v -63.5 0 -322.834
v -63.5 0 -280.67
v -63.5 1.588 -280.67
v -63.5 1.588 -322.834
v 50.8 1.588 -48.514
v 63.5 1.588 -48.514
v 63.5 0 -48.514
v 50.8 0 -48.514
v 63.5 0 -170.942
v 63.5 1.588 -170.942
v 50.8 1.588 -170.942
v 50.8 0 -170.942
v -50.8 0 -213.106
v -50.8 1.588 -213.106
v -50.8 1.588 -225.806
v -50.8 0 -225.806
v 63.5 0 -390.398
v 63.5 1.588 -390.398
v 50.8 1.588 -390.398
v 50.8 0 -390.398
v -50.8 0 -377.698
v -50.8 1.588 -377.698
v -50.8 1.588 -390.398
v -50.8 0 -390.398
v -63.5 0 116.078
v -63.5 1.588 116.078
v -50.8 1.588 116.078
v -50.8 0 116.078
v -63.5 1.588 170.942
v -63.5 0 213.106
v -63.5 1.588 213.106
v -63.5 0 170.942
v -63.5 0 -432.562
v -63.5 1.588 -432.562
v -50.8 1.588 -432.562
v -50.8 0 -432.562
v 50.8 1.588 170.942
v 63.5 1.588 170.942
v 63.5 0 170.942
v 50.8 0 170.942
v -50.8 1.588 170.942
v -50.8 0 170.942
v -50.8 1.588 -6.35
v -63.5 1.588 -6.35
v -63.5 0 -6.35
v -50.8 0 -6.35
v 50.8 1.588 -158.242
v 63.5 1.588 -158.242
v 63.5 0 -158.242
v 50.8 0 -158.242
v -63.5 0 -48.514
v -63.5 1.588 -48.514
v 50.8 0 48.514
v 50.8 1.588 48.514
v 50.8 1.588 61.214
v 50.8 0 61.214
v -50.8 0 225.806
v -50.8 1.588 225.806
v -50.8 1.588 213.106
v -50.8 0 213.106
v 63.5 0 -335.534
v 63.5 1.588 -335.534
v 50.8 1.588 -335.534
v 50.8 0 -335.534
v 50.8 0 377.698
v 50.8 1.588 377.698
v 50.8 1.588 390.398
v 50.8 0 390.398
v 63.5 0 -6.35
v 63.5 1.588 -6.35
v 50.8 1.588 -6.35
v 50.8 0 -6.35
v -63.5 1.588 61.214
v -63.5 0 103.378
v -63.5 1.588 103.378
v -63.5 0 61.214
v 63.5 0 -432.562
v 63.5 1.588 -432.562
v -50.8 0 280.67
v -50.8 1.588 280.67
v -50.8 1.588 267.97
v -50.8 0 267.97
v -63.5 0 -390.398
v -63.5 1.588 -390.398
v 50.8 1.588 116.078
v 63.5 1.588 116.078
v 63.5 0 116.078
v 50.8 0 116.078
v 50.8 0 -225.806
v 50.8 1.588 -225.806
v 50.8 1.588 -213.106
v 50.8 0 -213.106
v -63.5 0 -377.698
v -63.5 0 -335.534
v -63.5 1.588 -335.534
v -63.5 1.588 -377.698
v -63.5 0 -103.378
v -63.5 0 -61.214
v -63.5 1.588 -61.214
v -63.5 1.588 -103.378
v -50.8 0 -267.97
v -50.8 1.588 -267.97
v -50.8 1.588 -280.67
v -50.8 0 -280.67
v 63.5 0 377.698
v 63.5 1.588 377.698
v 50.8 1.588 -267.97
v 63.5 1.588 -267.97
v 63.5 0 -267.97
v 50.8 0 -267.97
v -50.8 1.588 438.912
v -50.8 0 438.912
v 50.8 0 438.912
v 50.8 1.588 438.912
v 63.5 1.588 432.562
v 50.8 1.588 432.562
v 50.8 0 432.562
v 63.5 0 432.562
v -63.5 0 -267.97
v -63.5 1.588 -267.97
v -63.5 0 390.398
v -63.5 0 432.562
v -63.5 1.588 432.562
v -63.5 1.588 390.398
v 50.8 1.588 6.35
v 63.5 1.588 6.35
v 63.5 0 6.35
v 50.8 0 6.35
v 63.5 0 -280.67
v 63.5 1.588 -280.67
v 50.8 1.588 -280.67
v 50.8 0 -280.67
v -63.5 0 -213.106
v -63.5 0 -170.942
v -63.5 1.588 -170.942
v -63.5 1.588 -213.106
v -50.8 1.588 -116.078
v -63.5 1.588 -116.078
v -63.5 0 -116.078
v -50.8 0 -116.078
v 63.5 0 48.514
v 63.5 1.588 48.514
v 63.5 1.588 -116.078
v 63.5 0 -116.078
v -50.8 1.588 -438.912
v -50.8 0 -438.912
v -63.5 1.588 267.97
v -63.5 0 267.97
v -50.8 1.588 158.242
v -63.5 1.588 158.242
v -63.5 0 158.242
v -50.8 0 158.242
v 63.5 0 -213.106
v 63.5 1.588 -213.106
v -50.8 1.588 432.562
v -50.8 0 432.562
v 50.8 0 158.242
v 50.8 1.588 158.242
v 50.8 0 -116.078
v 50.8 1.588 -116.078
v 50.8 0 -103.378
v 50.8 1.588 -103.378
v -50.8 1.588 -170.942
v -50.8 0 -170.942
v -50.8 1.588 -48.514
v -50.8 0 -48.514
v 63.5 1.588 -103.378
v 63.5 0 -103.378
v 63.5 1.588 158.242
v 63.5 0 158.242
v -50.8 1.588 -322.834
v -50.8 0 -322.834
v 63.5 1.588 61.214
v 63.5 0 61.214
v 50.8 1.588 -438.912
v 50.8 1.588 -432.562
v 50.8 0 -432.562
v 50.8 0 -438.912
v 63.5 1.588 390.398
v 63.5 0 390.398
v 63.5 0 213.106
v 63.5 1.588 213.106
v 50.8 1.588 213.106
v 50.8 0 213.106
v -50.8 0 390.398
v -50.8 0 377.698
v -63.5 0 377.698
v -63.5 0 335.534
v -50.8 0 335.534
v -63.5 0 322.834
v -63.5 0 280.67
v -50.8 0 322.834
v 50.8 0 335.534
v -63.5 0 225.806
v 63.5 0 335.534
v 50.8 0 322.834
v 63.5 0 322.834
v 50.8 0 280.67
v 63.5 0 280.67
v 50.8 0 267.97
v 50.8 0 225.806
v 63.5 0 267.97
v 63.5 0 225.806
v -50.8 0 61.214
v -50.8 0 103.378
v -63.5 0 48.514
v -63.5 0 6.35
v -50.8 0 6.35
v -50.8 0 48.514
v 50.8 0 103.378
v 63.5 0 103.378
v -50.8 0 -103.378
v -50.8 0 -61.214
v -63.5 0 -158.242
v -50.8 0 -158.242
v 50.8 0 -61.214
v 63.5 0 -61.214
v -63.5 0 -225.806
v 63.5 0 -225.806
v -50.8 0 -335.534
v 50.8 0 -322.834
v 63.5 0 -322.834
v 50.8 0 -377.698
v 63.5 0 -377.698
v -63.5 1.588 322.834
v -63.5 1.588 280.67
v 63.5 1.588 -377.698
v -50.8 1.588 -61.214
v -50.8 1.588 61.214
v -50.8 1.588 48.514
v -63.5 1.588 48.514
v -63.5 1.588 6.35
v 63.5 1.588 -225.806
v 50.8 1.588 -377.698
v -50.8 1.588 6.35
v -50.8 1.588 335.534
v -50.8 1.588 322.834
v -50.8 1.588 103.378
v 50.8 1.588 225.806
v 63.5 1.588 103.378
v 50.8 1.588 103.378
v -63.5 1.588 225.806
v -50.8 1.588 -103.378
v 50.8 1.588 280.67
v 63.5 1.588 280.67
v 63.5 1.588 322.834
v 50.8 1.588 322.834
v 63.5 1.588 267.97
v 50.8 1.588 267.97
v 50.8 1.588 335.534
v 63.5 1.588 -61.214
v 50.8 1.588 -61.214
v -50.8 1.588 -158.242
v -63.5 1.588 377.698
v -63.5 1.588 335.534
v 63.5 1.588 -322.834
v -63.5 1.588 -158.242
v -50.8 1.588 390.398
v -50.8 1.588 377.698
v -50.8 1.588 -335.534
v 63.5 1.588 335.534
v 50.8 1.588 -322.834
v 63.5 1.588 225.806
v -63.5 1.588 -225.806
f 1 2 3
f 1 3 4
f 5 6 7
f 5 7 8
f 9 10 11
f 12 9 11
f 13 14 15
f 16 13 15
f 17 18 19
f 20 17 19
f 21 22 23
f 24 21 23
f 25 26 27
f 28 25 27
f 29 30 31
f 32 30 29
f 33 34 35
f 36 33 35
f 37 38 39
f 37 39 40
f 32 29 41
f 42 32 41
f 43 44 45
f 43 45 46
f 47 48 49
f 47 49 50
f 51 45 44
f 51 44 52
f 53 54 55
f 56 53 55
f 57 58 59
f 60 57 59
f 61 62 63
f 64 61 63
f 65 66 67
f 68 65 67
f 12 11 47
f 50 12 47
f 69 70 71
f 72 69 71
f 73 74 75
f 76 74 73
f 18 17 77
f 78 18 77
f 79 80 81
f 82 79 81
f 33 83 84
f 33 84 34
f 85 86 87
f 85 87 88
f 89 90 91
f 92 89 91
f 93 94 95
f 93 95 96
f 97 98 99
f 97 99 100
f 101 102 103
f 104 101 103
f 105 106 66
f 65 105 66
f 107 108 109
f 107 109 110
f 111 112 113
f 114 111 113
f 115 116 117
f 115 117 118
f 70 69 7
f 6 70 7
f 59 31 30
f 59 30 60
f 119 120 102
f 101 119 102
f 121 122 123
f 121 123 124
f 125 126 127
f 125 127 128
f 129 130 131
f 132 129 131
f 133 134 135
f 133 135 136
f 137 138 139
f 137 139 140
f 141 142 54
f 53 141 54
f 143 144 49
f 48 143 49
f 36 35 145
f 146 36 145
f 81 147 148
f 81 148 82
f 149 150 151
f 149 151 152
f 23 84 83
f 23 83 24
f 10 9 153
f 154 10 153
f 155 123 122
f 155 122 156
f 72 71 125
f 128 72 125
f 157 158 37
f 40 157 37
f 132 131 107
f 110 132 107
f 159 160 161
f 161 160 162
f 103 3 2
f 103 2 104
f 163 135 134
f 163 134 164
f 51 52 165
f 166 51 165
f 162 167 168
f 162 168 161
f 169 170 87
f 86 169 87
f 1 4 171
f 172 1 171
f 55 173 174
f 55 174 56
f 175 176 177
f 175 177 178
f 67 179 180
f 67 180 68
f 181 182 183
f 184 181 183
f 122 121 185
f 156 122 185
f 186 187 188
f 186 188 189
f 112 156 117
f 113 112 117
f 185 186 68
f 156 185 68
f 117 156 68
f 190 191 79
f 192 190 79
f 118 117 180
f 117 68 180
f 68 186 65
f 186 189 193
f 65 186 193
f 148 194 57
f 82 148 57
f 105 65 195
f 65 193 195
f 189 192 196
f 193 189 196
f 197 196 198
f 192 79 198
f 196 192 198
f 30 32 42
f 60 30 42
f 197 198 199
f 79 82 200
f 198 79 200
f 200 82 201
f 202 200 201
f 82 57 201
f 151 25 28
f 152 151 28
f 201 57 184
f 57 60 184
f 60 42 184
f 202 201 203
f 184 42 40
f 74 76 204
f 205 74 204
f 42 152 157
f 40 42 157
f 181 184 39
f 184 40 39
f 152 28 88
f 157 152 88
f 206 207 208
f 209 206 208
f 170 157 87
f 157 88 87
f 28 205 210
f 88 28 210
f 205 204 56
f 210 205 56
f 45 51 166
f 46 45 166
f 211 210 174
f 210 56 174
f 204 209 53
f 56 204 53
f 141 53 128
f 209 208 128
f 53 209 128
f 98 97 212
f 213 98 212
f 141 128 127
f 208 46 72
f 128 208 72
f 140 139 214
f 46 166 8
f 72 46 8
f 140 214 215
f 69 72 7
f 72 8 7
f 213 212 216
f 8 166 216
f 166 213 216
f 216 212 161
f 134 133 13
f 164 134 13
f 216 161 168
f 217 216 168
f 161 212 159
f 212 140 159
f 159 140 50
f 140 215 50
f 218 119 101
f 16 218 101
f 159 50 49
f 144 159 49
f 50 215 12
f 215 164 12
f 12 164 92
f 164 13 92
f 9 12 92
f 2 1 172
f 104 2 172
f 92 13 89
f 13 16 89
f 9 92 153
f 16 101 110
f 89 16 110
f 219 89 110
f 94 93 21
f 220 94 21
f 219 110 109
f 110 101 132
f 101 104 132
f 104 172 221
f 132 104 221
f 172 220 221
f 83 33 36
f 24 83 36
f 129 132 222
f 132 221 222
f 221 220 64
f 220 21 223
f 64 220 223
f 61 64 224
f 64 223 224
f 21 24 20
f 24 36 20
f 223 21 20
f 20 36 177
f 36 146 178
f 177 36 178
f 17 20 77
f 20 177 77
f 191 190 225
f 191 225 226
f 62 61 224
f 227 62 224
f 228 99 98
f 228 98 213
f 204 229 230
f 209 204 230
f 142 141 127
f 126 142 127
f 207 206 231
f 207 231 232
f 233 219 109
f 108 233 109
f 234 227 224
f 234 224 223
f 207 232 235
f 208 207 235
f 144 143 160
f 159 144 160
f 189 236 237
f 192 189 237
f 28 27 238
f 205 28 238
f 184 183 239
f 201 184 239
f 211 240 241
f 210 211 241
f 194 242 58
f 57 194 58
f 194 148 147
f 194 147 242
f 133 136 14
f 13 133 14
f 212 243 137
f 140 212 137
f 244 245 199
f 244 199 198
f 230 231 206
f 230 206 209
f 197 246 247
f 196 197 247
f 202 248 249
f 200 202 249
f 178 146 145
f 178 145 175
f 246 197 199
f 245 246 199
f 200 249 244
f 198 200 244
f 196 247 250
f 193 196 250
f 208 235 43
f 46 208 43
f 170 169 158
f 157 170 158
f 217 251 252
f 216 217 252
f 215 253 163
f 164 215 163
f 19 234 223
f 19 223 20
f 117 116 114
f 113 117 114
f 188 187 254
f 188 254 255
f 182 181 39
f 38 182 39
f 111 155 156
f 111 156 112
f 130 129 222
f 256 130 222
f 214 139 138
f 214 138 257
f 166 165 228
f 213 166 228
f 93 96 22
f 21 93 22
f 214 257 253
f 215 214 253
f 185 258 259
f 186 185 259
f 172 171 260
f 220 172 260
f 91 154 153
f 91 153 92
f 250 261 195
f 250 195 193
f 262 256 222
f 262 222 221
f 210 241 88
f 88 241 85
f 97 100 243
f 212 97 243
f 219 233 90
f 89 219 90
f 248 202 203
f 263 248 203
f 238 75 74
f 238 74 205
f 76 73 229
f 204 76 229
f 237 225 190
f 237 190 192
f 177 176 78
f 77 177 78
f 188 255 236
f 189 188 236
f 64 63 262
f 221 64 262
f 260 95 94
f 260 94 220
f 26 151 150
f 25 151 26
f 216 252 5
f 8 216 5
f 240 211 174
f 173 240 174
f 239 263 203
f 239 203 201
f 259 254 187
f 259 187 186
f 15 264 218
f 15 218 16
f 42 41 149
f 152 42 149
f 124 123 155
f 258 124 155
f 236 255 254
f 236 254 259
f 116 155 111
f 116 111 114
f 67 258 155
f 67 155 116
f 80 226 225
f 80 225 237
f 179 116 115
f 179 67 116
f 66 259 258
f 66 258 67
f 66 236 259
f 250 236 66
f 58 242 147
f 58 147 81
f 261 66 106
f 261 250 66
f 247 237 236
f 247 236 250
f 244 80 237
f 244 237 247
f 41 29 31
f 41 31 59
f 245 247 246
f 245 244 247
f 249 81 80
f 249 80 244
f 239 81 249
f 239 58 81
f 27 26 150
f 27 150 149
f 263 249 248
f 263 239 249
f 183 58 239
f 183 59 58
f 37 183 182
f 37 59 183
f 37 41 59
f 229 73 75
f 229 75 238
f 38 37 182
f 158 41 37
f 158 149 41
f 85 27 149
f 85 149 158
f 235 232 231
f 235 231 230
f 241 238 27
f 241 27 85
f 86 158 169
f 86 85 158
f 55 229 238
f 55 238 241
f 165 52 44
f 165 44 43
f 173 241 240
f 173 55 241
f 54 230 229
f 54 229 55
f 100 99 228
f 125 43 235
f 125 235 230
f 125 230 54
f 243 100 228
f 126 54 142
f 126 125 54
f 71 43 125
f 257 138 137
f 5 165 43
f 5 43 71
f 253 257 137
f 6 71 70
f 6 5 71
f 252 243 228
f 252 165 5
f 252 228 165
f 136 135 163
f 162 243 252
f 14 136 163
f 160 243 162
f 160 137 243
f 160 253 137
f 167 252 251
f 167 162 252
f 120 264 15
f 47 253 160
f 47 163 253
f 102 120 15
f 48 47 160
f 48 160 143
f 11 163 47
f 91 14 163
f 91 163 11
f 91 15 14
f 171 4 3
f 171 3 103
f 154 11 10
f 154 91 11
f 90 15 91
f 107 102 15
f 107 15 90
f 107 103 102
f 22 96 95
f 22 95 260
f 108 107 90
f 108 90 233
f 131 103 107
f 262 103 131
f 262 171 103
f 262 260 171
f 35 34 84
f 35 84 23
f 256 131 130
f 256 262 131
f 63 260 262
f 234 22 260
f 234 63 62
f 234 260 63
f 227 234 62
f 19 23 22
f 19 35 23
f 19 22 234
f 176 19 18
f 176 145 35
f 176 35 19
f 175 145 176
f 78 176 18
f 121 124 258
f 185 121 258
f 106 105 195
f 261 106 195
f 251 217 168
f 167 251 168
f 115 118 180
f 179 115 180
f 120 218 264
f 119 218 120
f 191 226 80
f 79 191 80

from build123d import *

# Parameters (mm, degrees)
SKETCH1_W                  = 127
SKETCH1_H                  = 877.824
BOSS_EXTRUDE1_DEPTH        = 1.5875
SKETCH2_W                  = 12.7
SKETCH2_H                  = 6.35
CUT_EXTRUDE1_DEPTH         = 444.48451371
SKETCH3_W                  = 12.7
SKETCH3_H                  = 12.7
CUT_EXTRUDE2_DEPTH         = 444.48451371
LPATTERN1_COUNT            = 15
LPATTERN1_PITCH            = 54.864
LPATTERN1_COPY_1_SKETCH_W  = 12.7
LPATTERN1_COPY_1_SKETCH_H  = 12.7
LPATTERN1_COPY_1_DEPTH     = 444.48451371
LPATTERN1_COPY_2_SKETCH_W  = 12.7
LPATTERN1_COPY_2_SKETCH_H  = 12.7
LPATTERN1_COPY_2_DEPTH     = 444.48451371
LPATTERN1_COPY_3_SKETCH_W  = 12.7
LPATTERN1_COPY_3_SKETCH_H  = 12.7
LPATTERN1_COPY_3_DEPTH     = 444.48451371
LPATTERN1_COPY_4_SKETCH_W  = 12.7
LPATTERN1_COPY_4_SKETCH_H  = 12.7
LPATTERN1_COPY_4_DEPTH     = 444.48451371
LPATTERN1_COPY_5_SKETCH_W  = 12.7
LPATTERN1_COPY_5_SKETCH_H  = 12.7
LPATTERN1_COPY_5_DEPTH     = 444.48451371
LPATTERN1_COPY_6_SKETCH_W  = 12.7
LPATTERN1_COPY_6_SKETCH_H  = 12.7
LPATTERN1_COPY_6_DEPTH     = 444.48451371
LPATTERN1_COPY_7_SKETCH_W  = 12.7
LPATTERN1_COPY_7_SKETCH_H  = 12.7
LPATTERN1_COPY_7_DEPTH     = 444.48451371
LPATTERN1_COPY_8_SKETCH_W  = 12.7
LPATTERN1_COPY_8_SKETCH_H  = 12.7
LPATTERN1_COPY_8_DEPTH     = 444.48451371
LPATTERN1_COPY_9_SKETCH_W  = 12.7
LPATTERN1_COPY_9_SKETCH_H  = 12.7
LPATTERN1_COPY_9_DEPTH     = 444.48451371
LPATTERN1_COPY_10_SKETCH_W = 12.7
LPATTERN1_COPY_10_SKETCH_H = 12.7
LPATTERN1_COPY_10_DEPTH    = 444.48451371
LPATTERN1_COPY_11_SKETCH_W = 12.7
LPATTERN1_COPY_11_SKETCH_H = 12.7
LPATTERN1_COPY_11_DEPTH    = 444.48451371
LPATTERN1_COPY_12_SKETCH_W = 12.7
LPATTERN1_COPY_12_SKETCH_H = 12.7
LPATTERN1_COPY_12_DEPTH    = 444.48451371
LPATTERN1_COPY_13_SKETCH_W = 12.7
LPATTERN1_COPY_13_SKETCH_H = 12.7
LPATTERN1_COPY_13_DEPTH    = 444.48451371
LPATTERN1_COPY_14_SKETCH_W = 12.7
LPATTERN1_COPY_14_SKETCH_H = 12.7
LPATTERN1_COPY_14_DEPTH    = 444.48451371


with BuildPart() as part:
    # Sketch1 → Boss-Extrude1 (new body)
    with BuildSketch(Plane(origin=(0, 0, 0), x_dir=(1, 0, 0), z_dir=(0, 1, 0))):
        Rectangle(SKETCH1_W, SKETCH1_H)
    extrude(amount=BOSS_EXTRUDE1_DEPTH)

    # Sketch2 → Cut-Extrude1 (cut, through all)
    with BuildSketch(Plane(origin=(0, 1.5875, 0), x_dir=(1, 0, 0), z_dir=(0, 1, 0))):
        with Locations((-57.15, 435.737)):
            Rectangle(SKETCH2_W, SKETCH2_H)
        with Locations((57.15, 435.737)):
            Rectangle(SKETCH2_W, SKETCH2_H)
    cut_extrude1 = extrude(amount=-CUT_EXTRUDE1_DEPTH, mode=Mode.SUBTRACT)

    # Mirror1: Cut-Extrude1 across plane
    add(cut_extrude1.mirror(Plane.XY), mode=Mode.SUBTRACT)

    # Sketch3 → Cut-Extrude2 (cut, through all)
    with BuildSketch(Plane(origin=(0, 1.5875, 0), x_dir=(1, 0, 0), z_dir=(0, 1, 0))):
        with Locations((-57.15, 384.048)):
            Rectangle(SKETCH3_W, SKETCH3_H)
    cut_extrude2 = extrude(amount=-CUT_EXTRUDE2_DEPTH, mode=Mode.SUBTRACT)

    # Mirror2: Cut-Extrude2 across plane
    add(cut_extrude2.mirror(Plane(origin=(0, 0, 0), x_dir=(0, 0, 1), z_dir=(1, 0, 0))), mode=Mode.SUBTRACT)

    # LPattern1: Cut-Extrude2 ×15
    with Locations(*[(0, 0, i * LPATTERN1_PITCH) for i in range(1, LPATTERN1_COUNT)]):
        add(cut_extrude2, mode=Mode.SUBTRACT)

    # LPattern1 copy 1 sketch → LPattern1 copy 1 (cut, through all)
    with BuildSketch(Plane(origin=(0, 1.5875, 54.864), x_dir=(-1, 0, 0), z_dir=(0, 1, 0))):
        with Locations((-57.15, -384.048)):
            Rectangle(LPATTERN1_COPY_1_SKETCH_W, LPATTERN1_COPY_1_SKETCH_H)
    extrude(amount=-LPATTERN1_COPY_1_DEPTH, mode=Mode.SUBTRACT)

    # LPattern1 copy 2 sketch → LPattern1 copy 2 (cut, through all)
    with BuildSketch(Plane(origin=(0, 1.5875, 109.728), x_dir=(-1, 0, 0), z_dir=(0, 1, 0))):
        with Locations((-57.15, -384.048)):
            Rectangle(LPATTERN1_COPY_2_SKETCH_W, LPATTERN1_COPY_2_SKETCH_H)
    extrude(amount=-LPATTERN1_COPY_2_DEPTH, mode=Mode.SUBTRACT)

    # LPattern1 copy 3 sketch → LPattern1 copy 3 (cut, through all)
    with BuildSketch(Plane(origin=(0, 1.5875, 164.592), x_dir=(-1, 0, 0), z_dir=(0, 1, 0))):
        with Locations((-57.15, -384.048)):
            Rectangle(LPATTERN1_COPY_3_SKETCH_W, LPATTERN1_COPY_3_SKETCH_H)
    extrude(amount=-LPATTERN1_COPY_3_DEPTH, mode=Mode.SUBTRACT)

    # LPattern1 copy 4 sketch → LPattern1 copy 4 (cut, through all)
    with BuildSketch(Plane(origin=(0, 1.5875, 219.456), x_dir=(-1, 0, 0), z_dir=(0, 1, 0))):
        with Locations((-57.15, -384.048)):
            Rectangle(LPATTERN1_COPY_4_SKETCH_W, LPATTERN1_COPY_4_SKETCH_H)
    extrude(amount=-LPATTERN1_COPY_4_DEPTH, mode=Mode.SUBTRACT)

    # LPattern1 copy 5 sketch → LPattern1 copy 5 (cut, through all)
    with BuildSketch(Plane(origin=(0, 1.5875, 274.32), x_dir=(-1, 0, 0), z_dir=(0, 1, 0))):
        with Locations((-57.15, -384.048)):
            Rectangle(LPATTERN1_COPY_5_SKETCH_W, LPATTERN1_COPY_5_SKETCH_H)
    extrude(amount=-LPATTERN1_COPY_5_DEPTH, mode=Mode.SUBTRACT)

    # LPattern1 copy 6 sketch → LPattern1 copy 6 (cut, through all)
    with BuildSketch(Plane(origin=(0, 1.5875, 329.184), x_dir=(-1, 0, 0), z_dir=(0, 1, 0))):
        with Locations((-57.15, -384.048)):
            Rectangle(LPATTERN1_COPY_6_SKETCH_W, LPATTERN1_COPY_6_SKETCH_H)
    extrude(amount=-LPATTERN1_COPY_6_DEPTH, mode=Mode.SUBTRACT)

    # LPattern1 copy 7 sketch → LPattern1 copy 7 (cut, through all)
    with BuildSketch(Plane(origin=(0, 1.5875, 384.048), x_dir=(-1, 0, 0), z_dir=(0, 1, 0))):
        with Locations((-57.15, -384.048)):
            Rectangle(LPATTERN1_COPY_7_SKETCH_W, LPATTERN1_COPY_7_SKETCH_H)
    extrude(amount=-LPATTERN1_COPY_7_DEPTH, mode=Mode.SUBTRACT)

    # LPattern1 copy 8 sketch → LPattern1 copy 8 (cut, through all)
    with BuildSketch(Plane(origin=(0, 1.5875, 438.912), x_dir=(-1, 0, 0), z_dir=(0, 1, 0))):
        with Locations((-57.15, -384.048)):
            Rectangle(LPATTERN1_COPY_8_SKETCH_W, LPATTERN1_COPY_8_SKETCH_H)
    extrude(amount=-LPATTERN1_COPY_8_DEPTH, mode=Mode.SUBTRACT)

    # LPattern1 copy 9 sketch → LPattern1 copy 9 (cut, through all)
    with BuildSketch(Plane(origin=(0, 1.5875, 493.776), x_dir=(-1, 0, 0), z_dir=(0, 1, 0))):
        with Locations((-57.15, -384.048)):
            Rectangle(LPATTERN1_COPY_9_SKETCH_W, LPATTERN1_COPY_9_SKETCH_H)
    extrude(amount=-LPATTERN1_COPY_9_DEPTH, mode=Mode.SUBTRACT)

    # LPattern1 copy 10 sketch → LPattern1 copy 10 (cut, through all)
    with BuildSketch(Plane(origin=(0, 1.5875, 548.64), x_dir=(-1, 0, 0), z_dir=(0, 1, 0))):
        with Locations((-57.15, -384.048)):
            Rectangle(LPATTERN1_COPY_10_SKETCH_W, LPATTERN1_COPY_10_SKETCH_H)
    extrude(amount=-LPATTERN1_COPY_10_DEPTH, mode=Mode.SUBTRACT)

    # LPattern1 copy 11 sketch → LPattern1 copy 11 (cut, through all)
    with BuildSketch(Plane(origin=(0, 1.5875, 603.504), x_dir=(-1, 0, 0), z_dir=(0, 1, 0))):
        with Locations((-57.15, -384.048)):
            Rectangle(LPATTERN1_COPY_11_SKETCH_W, LPATTERN1_COPY_11_SKETCH_H)
    extrude(amount=-LPATTERN1_COPY_11_DEPTH, mode=Mode.SUBTRACT)

    # LPattern1 copy 12 sketch → LPattern1 copy 12 (cut, through all)
    with BuildSketch(Plane(origin=(0, 1.5875, 658.368), x_dir=(-1, 0, 0), z_dir=(0, 1, 0))):
        with Locations((-57.15, -384.048)):
            Rectangle(LPATTERN1_COPY_12_SKETCH_W, LPATTERN1_COPY_12_SKETCH_H)
    extrude(amount=-LPATTERN1_COPY_12_DEPTH, mode=Mode.SUBTRACT)

    # LPattern1 copy 13 sketch → LPattern1 copy 13 (cut, through all)
    with BuildSketch(Plane(origin=(0, 1.5875, 713.232), x_dir=(-1, 0, 0), z_dir=(0, 1, 0))):
        with Locations((-57.15, -384.048)):
            Rectangle(LPATTERN1_COPY_13_SKETCH_W, LPATTERN1_COPY_13_SKETCH_H)
    extrude(amount=-LPATTERN1_COPY_13_DEPTH, mode=Mode.SUBTRACT)

    # LPattern1 copy 14 sketch → LPattern1 copy 14 (cut, through all)
    with BuildSketch(Plane(origin=(0, 1.5875, 768.096), x_dir=(-1, 0, 0), z_dir=(0, 1, 0))):
        with Locations((-57.15, -384.048)):
            Rectangle(LPATTERN1_COPY_14_SKETCH_W, LPATTERN1_COPY_14_SKETCH_H)
    extrude(amount=-LPATTERN1_COPY_14_DEPTH, mode=Mode.SUBTRACT)


solid = part.part
